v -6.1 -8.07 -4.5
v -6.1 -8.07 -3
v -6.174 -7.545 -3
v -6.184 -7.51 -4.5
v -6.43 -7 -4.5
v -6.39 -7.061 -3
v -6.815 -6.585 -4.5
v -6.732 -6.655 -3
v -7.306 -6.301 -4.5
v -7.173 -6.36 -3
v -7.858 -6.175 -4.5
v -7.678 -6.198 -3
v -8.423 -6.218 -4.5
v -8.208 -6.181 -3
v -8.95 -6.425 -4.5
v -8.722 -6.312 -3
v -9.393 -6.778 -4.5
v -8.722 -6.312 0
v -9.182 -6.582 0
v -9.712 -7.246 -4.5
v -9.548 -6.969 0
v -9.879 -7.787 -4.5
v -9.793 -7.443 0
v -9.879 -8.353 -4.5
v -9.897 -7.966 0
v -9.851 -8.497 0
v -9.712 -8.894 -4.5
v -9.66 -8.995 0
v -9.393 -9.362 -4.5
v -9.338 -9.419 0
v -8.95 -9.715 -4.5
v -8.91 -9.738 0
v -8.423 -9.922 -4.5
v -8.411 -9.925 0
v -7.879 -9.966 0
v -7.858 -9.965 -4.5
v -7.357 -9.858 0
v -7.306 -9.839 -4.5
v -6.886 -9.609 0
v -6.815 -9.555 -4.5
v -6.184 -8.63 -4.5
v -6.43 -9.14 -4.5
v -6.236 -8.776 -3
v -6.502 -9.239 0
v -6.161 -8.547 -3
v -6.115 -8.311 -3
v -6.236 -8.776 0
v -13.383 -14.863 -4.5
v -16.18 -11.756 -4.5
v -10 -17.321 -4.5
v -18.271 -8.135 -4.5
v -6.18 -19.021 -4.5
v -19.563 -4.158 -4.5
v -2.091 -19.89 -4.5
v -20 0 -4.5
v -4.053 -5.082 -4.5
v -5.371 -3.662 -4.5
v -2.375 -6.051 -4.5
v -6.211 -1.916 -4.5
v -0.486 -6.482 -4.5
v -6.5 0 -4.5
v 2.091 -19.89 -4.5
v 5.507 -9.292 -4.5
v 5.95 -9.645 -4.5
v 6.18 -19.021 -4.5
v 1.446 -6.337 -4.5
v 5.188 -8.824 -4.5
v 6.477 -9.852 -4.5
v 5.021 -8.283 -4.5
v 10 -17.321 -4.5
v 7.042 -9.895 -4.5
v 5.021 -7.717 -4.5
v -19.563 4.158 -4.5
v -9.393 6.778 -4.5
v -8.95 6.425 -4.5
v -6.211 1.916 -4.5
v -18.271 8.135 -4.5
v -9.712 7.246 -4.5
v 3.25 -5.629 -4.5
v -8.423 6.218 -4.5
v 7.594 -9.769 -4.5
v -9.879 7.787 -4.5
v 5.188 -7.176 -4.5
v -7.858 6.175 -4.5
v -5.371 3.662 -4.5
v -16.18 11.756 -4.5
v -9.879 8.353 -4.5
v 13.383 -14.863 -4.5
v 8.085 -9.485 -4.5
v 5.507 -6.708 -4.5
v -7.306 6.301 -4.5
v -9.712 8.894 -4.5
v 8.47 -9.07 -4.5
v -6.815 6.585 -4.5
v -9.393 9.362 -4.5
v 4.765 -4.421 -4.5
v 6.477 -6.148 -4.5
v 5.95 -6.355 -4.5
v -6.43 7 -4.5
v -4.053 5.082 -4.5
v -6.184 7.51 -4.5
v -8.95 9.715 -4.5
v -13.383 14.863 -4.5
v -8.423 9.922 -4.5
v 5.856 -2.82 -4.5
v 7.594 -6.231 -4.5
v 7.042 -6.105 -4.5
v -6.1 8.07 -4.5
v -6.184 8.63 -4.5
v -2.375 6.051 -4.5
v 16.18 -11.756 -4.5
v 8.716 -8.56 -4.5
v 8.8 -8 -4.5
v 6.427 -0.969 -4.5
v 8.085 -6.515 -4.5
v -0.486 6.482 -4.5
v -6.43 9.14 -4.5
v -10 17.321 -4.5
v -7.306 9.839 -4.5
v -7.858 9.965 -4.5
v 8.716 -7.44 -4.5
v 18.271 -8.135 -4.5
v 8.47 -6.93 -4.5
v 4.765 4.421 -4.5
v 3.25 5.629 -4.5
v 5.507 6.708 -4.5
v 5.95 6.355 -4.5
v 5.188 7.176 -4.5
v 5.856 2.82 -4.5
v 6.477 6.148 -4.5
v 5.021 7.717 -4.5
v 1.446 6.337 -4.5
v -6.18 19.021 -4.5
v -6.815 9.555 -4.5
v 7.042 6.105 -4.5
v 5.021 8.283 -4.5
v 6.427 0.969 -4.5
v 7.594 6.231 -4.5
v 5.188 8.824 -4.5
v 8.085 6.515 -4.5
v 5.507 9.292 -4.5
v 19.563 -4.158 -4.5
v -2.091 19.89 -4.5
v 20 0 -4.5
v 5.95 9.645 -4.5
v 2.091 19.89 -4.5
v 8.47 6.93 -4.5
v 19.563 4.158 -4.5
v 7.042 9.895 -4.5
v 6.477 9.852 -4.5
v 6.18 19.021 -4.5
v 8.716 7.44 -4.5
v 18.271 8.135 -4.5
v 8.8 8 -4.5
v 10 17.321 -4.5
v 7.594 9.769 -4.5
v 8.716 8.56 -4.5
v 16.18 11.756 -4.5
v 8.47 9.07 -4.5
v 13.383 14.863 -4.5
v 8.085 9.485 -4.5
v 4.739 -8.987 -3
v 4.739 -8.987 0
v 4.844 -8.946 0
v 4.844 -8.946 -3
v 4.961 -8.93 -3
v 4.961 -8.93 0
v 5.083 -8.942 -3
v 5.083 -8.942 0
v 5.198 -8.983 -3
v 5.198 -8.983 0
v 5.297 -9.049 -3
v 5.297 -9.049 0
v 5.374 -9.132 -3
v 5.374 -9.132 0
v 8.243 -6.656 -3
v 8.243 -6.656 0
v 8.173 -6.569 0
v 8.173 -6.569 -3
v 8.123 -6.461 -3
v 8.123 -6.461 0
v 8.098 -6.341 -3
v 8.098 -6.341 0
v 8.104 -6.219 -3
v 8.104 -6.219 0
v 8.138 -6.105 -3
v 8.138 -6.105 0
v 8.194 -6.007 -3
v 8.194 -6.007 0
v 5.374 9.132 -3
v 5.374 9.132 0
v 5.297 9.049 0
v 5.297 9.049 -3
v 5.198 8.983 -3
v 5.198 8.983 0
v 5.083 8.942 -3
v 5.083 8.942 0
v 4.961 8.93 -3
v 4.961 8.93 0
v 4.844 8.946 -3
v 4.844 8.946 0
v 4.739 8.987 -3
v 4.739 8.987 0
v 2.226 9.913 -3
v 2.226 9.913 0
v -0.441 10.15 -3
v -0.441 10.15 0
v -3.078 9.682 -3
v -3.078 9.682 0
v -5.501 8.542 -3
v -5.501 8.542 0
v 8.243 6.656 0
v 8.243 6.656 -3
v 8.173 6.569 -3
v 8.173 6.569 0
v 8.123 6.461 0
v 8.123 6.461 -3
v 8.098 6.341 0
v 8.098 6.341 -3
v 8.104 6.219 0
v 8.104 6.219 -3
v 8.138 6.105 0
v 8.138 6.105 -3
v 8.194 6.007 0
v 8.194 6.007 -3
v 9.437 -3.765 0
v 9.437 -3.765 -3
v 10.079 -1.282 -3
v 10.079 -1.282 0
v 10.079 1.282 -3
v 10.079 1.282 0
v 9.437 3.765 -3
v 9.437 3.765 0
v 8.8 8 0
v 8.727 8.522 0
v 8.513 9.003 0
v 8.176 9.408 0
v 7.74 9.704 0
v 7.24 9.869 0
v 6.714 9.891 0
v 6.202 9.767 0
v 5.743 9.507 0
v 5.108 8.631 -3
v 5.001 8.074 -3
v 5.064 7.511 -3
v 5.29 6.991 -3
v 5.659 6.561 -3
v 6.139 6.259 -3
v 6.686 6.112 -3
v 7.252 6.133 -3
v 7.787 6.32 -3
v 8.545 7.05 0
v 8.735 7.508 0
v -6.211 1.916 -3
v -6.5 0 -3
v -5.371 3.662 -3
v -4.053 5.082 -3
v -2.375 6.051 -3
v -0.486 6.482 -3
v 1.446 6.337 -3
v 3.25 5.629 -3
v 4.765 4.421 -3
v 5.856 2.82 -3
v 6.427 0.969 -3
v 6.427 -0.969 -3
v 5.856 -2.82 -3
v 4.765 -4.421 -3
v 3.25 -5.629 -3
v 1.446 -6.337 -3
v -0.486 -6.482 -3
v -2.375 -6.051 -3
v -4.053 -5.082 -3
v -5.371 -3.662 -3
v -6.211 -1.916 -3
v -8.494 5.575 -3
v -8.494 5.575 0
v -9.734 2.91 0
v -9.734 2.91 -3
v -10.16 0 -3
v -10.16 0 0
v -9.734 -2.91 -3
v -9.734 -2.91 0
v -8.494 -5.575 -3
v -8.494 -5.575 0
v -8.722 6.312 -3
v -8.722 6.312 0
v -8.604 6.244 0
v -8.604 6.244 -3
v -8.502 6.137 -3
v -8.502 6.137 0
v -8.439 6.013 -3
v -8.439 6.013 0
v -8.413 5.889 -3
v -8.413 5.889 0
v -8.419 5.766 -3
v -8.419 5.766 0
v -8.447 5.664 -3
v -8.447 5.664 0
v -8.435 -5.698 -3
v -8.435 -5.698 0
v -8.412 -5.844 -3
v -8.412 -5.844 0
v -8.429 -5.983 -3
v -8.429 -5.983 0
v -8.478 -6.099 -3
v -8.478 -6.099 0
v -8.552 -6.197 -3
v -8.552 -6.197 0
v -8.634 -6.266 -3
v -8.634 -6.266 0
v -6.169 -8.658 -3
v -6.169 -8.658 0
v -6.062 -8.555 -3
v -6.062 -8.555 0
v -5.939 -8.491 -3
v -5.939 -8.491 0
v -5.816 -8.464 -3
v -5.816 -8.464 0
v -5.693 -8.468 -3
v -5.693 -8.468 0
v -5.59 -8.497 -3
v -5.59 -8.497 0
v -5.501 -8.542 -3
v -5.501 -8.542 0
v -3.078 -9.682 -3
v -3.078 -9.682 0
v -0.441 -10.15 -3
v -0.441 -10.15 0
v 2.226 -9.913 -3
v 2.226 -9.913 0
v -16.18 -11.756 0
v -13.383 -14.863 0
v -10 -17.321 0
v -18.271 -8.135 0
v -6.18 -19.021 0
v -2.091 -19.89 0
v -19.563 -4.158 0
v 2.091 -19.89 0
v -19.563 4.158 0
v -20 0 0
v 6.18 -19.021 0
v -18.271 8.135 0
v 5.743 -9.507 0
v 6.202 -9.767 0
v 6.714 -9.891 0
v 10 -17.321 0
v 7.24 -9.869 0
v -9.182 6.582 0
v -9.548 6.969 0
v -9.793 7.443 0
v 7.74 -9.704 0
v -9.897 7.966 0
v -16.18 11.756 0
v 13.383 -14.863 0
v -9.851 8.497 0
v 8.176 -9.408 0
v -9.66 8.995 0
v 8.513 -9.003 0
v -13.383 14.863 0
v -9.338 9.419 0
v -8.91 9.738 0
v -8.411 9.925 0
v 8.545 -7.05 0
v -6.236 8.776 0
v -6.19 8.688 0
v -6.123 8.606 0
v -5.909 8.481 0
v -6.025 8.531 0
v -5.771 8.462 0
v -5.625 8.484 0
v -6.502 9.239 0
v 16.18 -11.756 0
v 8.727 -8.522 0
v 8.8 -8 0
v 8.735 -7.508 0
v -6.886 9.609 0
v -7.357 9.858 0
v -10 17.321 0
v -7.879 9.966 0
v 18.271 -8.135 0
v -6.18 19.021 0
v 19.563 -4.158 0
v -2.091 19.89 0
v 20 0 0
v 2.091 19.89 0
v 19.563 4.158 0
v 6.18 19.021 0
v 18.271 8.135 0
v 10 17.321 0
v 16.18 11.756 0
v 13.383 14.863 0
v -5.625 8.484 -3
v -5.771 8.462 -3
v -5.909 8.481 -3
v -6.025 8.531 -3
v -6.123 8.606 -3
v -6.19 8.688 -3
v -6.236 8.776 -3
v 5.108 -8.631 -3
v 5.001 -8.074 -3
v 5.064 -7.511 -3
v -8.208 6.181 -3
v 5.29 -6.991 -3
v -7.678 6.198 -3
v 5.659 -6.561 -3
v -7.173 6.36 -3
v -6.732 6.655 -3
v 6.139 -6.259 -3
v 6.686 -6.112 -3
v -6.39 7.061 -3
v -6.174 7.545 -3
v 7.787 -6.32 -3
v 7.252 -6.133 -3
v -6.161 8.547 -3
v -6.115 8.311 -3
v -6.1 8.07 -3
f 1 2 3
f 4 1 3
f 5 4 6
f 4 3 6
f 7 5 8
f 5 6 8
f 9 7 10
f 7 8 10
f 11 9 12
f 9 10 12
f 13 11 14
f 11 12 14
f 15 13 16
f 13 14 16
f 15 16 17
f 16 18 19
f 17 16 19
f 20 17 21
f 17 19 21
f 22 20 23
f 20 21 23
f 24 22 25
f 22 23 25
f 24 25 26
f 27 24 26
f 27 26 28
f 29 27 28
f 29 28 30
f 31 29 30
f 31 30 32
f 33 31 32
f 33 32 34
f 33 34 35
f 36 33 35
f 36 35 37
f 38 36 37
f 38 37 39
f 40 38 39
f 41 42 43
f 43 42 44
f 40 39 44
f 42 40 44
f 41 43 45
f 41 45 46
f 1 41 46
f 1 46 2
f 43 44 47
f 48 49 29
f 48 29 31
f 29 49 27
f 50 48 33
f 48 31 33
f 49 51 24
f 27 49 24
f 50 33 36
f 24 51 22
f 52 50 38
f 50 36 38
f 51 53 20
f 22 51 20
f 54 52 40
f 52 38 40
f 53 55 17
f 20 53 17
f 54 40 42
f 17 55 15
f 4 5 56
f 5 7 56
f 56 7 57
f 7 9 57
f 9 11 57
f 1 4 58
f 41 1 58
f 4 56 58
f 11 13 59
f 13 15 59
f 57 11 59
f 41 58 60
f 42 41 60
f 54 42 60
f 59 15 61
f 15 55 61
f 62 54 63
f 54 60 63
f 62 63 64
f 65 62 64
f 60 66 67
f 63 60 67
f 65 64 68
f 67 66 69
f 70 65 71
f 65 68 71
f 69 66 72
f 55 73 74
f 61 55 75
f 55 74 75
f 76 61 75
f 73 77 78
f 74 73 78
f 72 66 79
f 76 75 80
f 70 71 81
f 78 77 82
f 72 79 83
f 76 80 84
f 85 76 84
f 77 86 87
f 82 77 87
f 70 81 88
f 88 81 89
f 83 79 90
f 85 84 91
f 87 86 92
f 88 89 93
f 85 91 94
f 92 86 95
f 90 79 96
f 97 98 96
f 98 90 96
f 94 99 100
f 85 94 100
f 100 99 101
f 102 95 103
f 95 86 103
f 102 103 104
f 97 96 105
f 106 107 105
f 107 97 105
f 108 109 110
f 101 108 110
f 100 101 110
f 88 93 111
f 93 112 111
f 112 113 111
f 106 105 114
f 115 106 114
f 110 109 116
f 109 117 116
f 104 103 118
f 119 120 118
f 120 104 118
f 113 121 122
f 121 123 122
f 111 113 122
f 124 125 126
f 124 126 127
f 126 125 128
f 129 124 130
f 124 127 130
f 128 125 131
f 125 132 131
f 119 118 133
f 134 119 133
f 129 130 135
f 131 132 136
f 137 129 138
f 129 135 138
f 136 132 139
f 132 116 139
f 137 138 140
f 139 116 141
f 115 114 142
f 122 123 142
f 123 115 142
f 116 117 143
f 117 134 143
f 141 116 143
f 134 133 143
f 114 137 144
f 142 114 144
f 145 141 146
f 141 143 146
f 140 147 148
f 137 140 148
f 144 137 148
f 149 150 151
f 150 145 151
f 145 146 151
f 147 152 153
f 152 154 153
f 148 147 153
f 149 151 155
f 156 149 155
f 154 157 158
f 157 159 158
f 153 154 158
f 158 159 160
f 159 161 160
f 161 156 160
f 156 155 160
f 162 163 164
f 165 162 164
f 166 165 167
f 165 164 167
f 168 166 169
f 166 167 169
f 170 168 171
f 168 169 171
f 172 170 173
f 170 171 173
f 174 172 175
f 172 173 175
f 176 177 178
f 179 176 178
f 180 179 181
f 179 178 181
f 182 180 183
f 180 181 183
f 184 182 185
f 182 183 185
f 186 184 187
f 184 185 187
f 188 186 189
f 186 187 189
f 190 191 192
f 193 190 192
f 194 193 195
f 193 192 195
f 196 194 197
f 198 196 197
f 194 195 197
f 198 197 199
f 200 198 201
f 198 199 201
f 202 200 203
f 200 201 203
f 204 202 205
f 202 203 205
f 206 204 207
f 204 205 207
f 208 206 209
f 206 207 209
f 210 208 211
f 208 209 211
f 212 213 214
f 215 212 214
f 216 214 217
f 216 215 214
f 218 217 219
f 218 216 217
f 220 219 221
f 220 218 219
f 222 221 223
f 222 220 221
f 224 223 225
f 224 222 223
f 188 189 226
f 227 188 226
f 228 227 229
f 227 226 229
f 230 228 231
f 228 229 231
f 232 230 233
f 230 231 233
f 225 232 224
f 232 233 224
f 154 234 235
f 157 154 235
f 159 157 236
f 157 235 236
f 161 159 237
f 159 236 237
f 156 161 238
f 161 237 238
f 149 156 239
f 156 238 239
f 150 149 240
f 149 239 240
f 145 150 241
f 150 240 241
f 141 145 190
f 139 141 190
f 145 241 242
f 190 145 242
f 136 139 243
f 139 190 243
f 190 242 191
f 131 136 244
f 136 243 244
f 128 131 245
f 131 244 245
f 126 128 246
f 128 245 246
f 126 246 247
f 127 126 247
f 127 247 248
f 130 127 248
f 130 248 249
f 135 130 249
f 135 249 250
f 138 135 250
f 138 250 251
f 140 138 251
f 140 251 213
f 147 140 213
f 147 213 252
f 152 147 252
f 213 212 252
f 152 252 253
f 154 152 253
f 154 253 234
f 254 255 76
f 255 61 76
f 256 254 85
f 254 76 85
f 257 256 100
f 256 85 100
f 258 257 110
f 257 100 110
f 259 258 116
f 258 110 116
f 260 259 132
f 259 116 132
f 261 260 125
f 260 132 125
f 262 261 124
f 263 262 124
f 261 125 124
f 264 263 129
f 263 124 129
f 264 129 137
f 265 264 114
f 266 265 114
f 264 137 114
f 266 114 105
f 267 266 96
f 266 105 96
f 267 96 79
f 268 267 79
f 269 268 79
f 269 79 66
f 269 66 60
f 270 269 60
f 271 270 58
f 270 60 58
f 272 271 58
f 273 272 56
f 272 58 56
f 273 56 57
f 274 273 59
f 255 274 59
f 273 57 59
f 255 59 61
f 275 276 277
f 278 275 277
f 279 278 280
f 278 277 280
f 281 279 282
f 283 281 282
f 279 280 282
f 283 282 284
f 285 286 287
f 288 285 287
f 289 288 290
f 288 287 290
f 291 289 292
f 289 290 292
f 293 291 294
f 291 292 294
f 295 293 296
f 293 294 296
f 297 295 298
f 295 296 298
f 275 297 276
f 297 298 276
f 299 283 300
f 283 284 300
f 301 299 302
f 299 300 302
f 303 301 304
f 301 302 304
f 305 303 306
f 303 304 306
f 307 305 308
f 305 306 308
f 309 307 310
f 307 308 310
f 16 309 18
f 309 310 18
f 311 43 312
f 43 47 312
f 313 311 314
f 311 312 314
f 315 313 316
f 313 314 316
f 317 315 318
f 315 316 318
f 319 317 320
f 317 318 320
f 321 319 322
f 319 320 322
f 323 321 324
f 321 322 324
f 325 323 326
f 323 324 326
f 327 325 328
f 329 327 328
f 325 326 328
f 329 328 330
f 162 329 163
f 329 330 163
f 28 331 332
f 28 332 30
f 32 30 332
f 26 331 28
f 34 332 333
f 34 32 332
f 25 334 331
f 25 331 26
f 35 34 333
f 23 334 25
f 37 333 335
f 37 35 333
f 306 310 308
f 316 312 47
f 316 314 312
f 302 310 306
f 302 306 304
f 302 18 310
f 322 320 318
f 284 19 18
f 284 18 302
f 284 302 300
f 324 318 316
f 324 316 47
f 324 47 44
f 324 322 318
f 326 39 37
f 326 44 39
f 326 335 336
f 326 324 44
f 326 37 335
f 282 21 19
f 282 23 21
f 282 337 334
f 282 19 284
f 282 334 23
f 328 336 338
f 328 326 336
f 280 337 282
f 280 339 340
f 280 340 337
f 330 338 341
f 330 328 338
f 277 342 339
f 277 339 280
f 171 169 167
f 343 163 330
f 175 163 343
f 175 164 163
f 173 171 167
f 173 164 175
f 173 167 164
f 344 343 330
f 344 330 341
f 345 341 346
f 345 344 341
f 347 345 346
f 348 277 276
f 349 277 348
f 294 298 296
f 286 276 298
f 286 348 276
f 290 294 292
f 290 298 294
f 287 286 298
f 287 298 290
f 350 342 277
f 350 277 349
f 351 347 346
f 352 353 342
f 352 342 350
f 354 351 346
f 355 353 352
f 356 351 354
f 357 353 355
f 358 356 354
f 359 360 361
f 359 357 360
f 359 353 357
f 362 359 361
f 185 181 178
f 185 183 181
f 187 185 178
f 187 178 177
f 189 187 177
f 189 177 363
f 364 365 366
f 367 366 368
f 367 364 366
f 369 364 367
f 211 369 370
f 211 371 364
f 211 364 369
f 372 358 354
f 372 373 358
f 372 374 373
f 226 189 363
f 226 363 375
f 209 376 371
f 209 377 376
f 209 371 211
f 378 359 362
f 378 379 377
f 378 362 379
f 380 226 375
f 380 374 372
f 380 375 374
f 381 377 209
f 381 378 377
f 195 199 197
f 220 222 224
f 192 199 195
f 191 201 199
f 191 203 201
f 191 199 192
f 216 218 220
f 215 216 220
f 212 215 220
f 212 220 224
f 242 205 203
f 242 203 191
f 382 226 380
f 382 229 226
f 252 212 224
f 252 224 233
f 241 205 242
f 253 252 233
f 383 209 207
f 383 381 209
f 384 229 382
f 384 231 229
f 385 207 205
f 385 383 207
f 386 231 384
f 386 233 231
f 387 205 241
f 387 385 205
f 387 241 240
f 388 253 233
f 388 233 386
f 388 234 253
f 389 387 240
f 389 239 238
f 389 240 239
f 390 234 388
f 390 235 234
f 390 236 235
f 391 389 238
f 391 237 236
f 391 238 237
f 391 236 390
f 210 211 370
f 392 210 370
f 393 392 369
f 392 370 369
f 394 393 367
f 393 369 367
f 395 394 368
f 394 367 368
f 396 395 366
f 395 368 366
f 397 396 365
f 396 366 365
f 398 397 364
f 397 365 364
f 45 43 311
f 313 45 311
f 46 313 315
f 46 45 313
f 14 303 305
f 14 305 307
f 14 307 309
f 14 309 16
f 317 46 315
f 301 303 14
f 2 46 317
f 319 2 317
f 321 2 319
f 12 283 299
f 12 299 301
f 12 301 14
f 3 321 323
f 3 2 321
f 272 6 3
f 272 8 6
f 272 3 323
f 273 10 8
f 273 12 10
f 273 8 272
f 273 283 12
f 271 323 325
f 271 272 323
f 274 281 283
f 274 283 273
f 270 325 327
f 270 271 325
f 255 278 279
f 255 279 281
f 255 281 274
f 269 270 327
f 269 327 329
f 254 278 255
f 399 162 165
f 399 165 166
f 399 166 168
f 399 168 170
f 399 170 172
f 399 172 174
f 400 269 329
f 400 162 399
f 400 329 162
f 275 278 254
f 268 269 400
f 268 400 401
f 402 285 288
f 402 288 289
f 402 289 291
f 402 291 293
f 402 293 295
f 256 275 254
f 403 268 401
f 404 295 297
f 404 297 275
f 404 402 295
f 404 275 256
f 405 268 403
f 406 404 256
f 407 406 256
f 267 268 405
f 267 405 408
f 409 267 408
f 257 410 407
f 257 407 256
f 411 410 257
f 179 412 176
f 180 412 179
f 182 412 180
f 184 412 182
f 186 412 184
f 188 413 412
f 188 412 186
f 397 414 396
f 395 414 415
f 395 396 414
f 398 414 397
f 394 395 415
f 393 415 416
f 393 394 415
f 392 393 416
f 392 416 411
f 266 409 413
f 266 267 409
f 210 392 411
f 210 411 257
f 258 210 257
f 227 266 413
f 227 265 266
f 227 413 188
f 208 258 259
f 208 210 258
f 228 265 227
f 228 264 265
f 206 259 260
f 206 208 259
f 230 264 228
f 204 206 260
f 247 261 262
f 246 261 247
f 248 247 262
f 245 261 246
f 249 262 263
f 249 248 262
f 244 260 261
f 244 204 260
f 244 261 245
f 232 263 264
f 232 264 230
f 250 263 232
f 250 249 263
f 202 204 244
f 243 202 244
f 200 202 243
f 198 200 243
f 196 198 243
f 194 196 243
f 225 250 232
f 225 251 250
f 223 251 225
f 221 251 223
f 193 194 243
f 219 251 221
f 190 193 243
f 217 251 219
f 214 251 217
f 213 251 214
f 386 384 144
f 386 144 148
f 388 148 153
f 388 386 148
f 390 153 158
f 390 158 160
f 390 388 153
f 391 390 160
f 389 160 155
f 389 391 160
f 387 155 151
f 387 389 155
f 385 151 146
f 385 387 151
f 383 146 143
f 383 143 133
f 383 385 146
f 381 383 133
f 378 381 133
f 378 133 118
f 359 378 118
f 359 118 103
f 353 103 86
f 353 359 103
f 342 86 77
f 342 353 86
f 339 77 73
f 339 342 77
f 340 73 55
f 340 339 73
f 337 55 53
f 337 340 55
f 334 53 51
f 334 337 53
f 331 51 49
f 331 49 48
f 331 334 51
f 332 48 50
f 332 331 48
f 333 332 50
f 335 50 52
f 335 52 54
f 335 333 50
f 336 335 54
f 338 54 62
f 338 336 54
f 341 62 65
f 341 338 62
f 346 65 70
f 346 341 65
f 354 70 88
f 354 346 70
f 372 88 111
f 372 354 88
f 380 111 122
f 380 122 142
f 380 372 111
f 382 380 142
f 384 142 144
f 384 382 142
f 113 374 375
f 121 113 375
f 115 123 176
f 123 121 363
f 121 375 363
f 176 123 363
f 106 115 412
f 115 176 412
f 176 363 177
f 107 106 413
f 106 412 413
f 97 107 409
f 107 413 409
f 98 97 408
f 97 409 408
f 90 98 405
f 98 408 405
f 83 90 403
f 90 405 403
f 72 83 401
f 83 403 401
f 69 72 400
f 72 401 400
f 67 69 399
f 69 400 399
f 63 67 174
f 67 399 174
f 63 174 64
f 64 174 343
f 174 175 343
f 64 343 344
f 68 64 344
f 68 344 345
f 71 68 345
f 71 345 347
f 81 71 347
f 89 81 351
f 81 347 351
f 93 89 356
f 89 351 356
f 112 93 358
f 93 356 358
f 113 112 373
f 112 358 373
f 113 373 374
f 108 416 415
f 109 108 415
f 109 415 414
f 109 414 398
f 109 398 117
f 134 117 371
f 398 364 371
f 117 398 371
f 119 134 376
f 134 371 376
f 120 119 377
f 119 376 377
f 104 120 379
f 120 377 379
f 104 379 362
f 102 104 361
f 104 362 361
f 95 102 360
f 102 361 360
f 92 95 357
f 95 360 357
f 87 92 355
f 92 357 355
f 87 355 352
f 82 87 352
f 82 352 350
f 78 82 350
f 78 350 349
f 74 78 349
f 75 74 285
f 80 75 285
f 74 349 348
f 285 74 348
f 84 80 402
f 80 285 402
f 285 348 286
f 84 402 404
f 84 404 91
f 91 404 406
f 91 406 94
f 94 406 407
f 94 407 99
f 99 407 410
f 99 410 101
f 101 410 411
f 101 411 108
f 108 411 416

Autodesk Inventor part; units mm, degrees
ref_plane "YZ Plane" through (0, 0, 0) normal (1, 0, 0) x (0, 1, 0)
ref_plane "XZ Plane" through (0, 0, 0) normal (0, 1, 0) x (-1, 0, 0)
ref_plane "XY Plane" through (0, 0, 0) normal (0, 0, 1) x (1, 0, 0)
sketch "Sketch8" plane through (0, 0, 0) normal (0, 0, 1) x (1, 0, 0)
  circle A0 centre (0, 0) radius 15
  dimension "d33" = 30
extrude "Extrusion7" add sketch "Sketch8" against normal blind 8
sketch "Sketch10" plane through (0, 0, -8) normal (0, 0, -1) x (-1, 0, 0)
  line L0 (9, 10.07) -> (-29.1, 10.07)
  arc A0 (10, 9.07) -> (9, 10.07) centre (9, 9.07) ccw
  line L1 (10, 9.07) -> (10, -9.07)
  arc A1 (9, -10.07) -> (10, -9.07) centre (9, -9.07) ccw
  line L2 (-29.1, -10.07) -> (9, -10.07)
  line L3 (-29.1, 10.07) -> (-29.1, -10.07)
  line L4 (10.4, -9.07) -> (10.4, 9.07)
  arc A2 (10.4, 9.07) -> (9, 10.47) centre (9, 9.07) ccw
  line L5 (9, 10.47) -> (-29.5, 10.47)
  line L6 (-29.5, 10.47) -> (-29.5, -10.47)
  line L7 (-29.5, -10.47) -> (9, -10.47)
  arc A3 (9, -10.47) -> (10.4, -9.07) centre (9, -9.07) ccw
  dimension "d59" = 0.4
extrude "Extrusion8" cut sketch "Sketch10" against normal blind 2 contours A0 L1 A1 L2 L3 L0 | A3 L7 L6 L5 A2 L4
sketch "Sketch11" plane through (0, 0, -6) normal (0, 0, -1) x (-1, 0, 0)
  circle A0 centre (0, 0) radius 6.4
  circle A1 centre (0, 0) radius 6.5
  point P0 (0, 0)
  dimension "d58" = 13
extrude "Extrusion9" cut sketch "Sketch11" against normal through all contours A0 | A1
sketch "Sketch13" plane through (0, 0, 0) normal (0, 0, 1) x (1, 0, 0)
  circle A0 centre (0, 0) radius 9.96
  circle A1 centre (0, 0) radius 10.16
  point P0 (0, 0)
  dimension "d44" = 0.2
extrude "Extrusion11" cut sketch "Sketch13" against normal blind 3 contours A0 | A1
sketch "Sketch14" plane through (0, 0, 0) normal (0, 0, 1) x (1, 0, 0)
  circle A0 centre (6.9, 8) radius 0.7835
  circle A1 centre (6.9, -8) radius 0.7835
  circle A2 centre (-8, 8.07) radius 1
  circle A3 centre (-8, -8.07) radius 1
  point P0 (0, 0)
hole "Hole2" at (6.9, 8, 0) at (-8, 8.07, 0) at (-8, -8.07, 0) at (6.9, -8, 0) direction (0, 0, -1) diameter 2.1 end through all
sketch "Sketch15" plane through (0, 0, 0) normal (0, 0, 1) x (1, 0, 0)
  arc A0 (7.3255, 7.0401) -> (5.888, 8.2799) centre (6.9, 8) ccw projected
  arc A1 (5.888, -8.2799) -> (7.3255, -7.0401) centre (6.9, -8) ccw projected
  circle A2 centre (-8, 8.07) radius 1.05 projected
  circle A3 centre (-8, -8.07) radius 1.05 projected
  circle A4 centre (6.9, 8) radius 1.9
  circle A5 centre (6.9, -8) radius 1.9
  circle A6 centre (-8, -8.07) radius 1.9
  circle A7 centre (-8, 8.07) radius 1.9
  point P0 (0, 0)
  dimension "d54" = 3.8
extrude "Extrusion12" cut sketch "Sketch15" against normal blind 4.5 contours A2 | A3 | A4 | A5 | A6 | A7
fillet "Fillet2" radius 0.5 8 edges at (5.1562, 8.7544, -1.5) (7.9023, 6.3859, -1.5) (-6.1008, 8.1244, -1.5) (-8.071, 6.1713, -1.5) (-8.071, -6.1713, -1.5) (-6.1008, -8.1244, -1.5) (5.1562, -8.7544, -1.5) (7.9023, -6.3859, -1.5)
sketch "Sketch16" plane through (0, 0, -8) normal (0, 0, -1) x (-1, 0, 0)
  circle A0 centre (-6.9, -8) radius 1.05 projected
  circle A1 centre (8, -8.07) radius 1.05 projected
  circle A2 centre (8, 8.07) radius 1.05 projected
  circle A3 centre (-6.9, 8) radius 1.05 projected
  circle A4 centre (0, 0) radius 6.5 projected
  arc A5 (-10.7415, 10.47) -> (-10.7415, -10.47) centre (0, 0) ccw projected
  line L0 (9, -10.47) -> (-10.7415, -10.47) projected
  arc A6 (9, -10.47) -> (10.4, -9.07) centre (9, -9.07) ccw projected
  line L1 (10.4, 9.07) -> (10.4, -9.07) projected
  arc A7 (10.4, 9.07) -> (9, 10.47) centre (9, 9.07) ccw projected
  line L2 (-10.7415, 10.47) -> (9, 10.47) projected
  line L3 (-10.7415, 10.47) -> (9, 10.47) projected
  arc A8 (10.4, 9.07) -> (9, 10.47) centre (9, 9.07) ccw projected
  line L4 (10.4, 9.07) -> (10.4, -9.07) projected
  arc A9 (9, -10.47) -> (10.4, -9.07) centre (9, -9.07) ccw projected
  line L5 (9, -10.47) -> (-10.7415, -10.47) projected
  arc A10 (-10.7415, -10.47) -> (-10.7415, 10.47) centre (0, 0) ccw projected
extrude "Extrusion14" cut sketch "Sketch16" against normal blind 3.5
sketch "Sketch19" plane through (0, 0, 0) normal (0, 0, 1) x (1, 0, 0)
  circle A0 centre (0, 0) radius 15
  circle A1 centre (0, 0) radius 20
  dimension "d67" = 30
  dimension "d68" = 40
extrude "Extrusion16" add sketch "Sketch19" against normal blind 4.5
properties part number "frame_motor_support" material "Aluminum 6061-AHC"
